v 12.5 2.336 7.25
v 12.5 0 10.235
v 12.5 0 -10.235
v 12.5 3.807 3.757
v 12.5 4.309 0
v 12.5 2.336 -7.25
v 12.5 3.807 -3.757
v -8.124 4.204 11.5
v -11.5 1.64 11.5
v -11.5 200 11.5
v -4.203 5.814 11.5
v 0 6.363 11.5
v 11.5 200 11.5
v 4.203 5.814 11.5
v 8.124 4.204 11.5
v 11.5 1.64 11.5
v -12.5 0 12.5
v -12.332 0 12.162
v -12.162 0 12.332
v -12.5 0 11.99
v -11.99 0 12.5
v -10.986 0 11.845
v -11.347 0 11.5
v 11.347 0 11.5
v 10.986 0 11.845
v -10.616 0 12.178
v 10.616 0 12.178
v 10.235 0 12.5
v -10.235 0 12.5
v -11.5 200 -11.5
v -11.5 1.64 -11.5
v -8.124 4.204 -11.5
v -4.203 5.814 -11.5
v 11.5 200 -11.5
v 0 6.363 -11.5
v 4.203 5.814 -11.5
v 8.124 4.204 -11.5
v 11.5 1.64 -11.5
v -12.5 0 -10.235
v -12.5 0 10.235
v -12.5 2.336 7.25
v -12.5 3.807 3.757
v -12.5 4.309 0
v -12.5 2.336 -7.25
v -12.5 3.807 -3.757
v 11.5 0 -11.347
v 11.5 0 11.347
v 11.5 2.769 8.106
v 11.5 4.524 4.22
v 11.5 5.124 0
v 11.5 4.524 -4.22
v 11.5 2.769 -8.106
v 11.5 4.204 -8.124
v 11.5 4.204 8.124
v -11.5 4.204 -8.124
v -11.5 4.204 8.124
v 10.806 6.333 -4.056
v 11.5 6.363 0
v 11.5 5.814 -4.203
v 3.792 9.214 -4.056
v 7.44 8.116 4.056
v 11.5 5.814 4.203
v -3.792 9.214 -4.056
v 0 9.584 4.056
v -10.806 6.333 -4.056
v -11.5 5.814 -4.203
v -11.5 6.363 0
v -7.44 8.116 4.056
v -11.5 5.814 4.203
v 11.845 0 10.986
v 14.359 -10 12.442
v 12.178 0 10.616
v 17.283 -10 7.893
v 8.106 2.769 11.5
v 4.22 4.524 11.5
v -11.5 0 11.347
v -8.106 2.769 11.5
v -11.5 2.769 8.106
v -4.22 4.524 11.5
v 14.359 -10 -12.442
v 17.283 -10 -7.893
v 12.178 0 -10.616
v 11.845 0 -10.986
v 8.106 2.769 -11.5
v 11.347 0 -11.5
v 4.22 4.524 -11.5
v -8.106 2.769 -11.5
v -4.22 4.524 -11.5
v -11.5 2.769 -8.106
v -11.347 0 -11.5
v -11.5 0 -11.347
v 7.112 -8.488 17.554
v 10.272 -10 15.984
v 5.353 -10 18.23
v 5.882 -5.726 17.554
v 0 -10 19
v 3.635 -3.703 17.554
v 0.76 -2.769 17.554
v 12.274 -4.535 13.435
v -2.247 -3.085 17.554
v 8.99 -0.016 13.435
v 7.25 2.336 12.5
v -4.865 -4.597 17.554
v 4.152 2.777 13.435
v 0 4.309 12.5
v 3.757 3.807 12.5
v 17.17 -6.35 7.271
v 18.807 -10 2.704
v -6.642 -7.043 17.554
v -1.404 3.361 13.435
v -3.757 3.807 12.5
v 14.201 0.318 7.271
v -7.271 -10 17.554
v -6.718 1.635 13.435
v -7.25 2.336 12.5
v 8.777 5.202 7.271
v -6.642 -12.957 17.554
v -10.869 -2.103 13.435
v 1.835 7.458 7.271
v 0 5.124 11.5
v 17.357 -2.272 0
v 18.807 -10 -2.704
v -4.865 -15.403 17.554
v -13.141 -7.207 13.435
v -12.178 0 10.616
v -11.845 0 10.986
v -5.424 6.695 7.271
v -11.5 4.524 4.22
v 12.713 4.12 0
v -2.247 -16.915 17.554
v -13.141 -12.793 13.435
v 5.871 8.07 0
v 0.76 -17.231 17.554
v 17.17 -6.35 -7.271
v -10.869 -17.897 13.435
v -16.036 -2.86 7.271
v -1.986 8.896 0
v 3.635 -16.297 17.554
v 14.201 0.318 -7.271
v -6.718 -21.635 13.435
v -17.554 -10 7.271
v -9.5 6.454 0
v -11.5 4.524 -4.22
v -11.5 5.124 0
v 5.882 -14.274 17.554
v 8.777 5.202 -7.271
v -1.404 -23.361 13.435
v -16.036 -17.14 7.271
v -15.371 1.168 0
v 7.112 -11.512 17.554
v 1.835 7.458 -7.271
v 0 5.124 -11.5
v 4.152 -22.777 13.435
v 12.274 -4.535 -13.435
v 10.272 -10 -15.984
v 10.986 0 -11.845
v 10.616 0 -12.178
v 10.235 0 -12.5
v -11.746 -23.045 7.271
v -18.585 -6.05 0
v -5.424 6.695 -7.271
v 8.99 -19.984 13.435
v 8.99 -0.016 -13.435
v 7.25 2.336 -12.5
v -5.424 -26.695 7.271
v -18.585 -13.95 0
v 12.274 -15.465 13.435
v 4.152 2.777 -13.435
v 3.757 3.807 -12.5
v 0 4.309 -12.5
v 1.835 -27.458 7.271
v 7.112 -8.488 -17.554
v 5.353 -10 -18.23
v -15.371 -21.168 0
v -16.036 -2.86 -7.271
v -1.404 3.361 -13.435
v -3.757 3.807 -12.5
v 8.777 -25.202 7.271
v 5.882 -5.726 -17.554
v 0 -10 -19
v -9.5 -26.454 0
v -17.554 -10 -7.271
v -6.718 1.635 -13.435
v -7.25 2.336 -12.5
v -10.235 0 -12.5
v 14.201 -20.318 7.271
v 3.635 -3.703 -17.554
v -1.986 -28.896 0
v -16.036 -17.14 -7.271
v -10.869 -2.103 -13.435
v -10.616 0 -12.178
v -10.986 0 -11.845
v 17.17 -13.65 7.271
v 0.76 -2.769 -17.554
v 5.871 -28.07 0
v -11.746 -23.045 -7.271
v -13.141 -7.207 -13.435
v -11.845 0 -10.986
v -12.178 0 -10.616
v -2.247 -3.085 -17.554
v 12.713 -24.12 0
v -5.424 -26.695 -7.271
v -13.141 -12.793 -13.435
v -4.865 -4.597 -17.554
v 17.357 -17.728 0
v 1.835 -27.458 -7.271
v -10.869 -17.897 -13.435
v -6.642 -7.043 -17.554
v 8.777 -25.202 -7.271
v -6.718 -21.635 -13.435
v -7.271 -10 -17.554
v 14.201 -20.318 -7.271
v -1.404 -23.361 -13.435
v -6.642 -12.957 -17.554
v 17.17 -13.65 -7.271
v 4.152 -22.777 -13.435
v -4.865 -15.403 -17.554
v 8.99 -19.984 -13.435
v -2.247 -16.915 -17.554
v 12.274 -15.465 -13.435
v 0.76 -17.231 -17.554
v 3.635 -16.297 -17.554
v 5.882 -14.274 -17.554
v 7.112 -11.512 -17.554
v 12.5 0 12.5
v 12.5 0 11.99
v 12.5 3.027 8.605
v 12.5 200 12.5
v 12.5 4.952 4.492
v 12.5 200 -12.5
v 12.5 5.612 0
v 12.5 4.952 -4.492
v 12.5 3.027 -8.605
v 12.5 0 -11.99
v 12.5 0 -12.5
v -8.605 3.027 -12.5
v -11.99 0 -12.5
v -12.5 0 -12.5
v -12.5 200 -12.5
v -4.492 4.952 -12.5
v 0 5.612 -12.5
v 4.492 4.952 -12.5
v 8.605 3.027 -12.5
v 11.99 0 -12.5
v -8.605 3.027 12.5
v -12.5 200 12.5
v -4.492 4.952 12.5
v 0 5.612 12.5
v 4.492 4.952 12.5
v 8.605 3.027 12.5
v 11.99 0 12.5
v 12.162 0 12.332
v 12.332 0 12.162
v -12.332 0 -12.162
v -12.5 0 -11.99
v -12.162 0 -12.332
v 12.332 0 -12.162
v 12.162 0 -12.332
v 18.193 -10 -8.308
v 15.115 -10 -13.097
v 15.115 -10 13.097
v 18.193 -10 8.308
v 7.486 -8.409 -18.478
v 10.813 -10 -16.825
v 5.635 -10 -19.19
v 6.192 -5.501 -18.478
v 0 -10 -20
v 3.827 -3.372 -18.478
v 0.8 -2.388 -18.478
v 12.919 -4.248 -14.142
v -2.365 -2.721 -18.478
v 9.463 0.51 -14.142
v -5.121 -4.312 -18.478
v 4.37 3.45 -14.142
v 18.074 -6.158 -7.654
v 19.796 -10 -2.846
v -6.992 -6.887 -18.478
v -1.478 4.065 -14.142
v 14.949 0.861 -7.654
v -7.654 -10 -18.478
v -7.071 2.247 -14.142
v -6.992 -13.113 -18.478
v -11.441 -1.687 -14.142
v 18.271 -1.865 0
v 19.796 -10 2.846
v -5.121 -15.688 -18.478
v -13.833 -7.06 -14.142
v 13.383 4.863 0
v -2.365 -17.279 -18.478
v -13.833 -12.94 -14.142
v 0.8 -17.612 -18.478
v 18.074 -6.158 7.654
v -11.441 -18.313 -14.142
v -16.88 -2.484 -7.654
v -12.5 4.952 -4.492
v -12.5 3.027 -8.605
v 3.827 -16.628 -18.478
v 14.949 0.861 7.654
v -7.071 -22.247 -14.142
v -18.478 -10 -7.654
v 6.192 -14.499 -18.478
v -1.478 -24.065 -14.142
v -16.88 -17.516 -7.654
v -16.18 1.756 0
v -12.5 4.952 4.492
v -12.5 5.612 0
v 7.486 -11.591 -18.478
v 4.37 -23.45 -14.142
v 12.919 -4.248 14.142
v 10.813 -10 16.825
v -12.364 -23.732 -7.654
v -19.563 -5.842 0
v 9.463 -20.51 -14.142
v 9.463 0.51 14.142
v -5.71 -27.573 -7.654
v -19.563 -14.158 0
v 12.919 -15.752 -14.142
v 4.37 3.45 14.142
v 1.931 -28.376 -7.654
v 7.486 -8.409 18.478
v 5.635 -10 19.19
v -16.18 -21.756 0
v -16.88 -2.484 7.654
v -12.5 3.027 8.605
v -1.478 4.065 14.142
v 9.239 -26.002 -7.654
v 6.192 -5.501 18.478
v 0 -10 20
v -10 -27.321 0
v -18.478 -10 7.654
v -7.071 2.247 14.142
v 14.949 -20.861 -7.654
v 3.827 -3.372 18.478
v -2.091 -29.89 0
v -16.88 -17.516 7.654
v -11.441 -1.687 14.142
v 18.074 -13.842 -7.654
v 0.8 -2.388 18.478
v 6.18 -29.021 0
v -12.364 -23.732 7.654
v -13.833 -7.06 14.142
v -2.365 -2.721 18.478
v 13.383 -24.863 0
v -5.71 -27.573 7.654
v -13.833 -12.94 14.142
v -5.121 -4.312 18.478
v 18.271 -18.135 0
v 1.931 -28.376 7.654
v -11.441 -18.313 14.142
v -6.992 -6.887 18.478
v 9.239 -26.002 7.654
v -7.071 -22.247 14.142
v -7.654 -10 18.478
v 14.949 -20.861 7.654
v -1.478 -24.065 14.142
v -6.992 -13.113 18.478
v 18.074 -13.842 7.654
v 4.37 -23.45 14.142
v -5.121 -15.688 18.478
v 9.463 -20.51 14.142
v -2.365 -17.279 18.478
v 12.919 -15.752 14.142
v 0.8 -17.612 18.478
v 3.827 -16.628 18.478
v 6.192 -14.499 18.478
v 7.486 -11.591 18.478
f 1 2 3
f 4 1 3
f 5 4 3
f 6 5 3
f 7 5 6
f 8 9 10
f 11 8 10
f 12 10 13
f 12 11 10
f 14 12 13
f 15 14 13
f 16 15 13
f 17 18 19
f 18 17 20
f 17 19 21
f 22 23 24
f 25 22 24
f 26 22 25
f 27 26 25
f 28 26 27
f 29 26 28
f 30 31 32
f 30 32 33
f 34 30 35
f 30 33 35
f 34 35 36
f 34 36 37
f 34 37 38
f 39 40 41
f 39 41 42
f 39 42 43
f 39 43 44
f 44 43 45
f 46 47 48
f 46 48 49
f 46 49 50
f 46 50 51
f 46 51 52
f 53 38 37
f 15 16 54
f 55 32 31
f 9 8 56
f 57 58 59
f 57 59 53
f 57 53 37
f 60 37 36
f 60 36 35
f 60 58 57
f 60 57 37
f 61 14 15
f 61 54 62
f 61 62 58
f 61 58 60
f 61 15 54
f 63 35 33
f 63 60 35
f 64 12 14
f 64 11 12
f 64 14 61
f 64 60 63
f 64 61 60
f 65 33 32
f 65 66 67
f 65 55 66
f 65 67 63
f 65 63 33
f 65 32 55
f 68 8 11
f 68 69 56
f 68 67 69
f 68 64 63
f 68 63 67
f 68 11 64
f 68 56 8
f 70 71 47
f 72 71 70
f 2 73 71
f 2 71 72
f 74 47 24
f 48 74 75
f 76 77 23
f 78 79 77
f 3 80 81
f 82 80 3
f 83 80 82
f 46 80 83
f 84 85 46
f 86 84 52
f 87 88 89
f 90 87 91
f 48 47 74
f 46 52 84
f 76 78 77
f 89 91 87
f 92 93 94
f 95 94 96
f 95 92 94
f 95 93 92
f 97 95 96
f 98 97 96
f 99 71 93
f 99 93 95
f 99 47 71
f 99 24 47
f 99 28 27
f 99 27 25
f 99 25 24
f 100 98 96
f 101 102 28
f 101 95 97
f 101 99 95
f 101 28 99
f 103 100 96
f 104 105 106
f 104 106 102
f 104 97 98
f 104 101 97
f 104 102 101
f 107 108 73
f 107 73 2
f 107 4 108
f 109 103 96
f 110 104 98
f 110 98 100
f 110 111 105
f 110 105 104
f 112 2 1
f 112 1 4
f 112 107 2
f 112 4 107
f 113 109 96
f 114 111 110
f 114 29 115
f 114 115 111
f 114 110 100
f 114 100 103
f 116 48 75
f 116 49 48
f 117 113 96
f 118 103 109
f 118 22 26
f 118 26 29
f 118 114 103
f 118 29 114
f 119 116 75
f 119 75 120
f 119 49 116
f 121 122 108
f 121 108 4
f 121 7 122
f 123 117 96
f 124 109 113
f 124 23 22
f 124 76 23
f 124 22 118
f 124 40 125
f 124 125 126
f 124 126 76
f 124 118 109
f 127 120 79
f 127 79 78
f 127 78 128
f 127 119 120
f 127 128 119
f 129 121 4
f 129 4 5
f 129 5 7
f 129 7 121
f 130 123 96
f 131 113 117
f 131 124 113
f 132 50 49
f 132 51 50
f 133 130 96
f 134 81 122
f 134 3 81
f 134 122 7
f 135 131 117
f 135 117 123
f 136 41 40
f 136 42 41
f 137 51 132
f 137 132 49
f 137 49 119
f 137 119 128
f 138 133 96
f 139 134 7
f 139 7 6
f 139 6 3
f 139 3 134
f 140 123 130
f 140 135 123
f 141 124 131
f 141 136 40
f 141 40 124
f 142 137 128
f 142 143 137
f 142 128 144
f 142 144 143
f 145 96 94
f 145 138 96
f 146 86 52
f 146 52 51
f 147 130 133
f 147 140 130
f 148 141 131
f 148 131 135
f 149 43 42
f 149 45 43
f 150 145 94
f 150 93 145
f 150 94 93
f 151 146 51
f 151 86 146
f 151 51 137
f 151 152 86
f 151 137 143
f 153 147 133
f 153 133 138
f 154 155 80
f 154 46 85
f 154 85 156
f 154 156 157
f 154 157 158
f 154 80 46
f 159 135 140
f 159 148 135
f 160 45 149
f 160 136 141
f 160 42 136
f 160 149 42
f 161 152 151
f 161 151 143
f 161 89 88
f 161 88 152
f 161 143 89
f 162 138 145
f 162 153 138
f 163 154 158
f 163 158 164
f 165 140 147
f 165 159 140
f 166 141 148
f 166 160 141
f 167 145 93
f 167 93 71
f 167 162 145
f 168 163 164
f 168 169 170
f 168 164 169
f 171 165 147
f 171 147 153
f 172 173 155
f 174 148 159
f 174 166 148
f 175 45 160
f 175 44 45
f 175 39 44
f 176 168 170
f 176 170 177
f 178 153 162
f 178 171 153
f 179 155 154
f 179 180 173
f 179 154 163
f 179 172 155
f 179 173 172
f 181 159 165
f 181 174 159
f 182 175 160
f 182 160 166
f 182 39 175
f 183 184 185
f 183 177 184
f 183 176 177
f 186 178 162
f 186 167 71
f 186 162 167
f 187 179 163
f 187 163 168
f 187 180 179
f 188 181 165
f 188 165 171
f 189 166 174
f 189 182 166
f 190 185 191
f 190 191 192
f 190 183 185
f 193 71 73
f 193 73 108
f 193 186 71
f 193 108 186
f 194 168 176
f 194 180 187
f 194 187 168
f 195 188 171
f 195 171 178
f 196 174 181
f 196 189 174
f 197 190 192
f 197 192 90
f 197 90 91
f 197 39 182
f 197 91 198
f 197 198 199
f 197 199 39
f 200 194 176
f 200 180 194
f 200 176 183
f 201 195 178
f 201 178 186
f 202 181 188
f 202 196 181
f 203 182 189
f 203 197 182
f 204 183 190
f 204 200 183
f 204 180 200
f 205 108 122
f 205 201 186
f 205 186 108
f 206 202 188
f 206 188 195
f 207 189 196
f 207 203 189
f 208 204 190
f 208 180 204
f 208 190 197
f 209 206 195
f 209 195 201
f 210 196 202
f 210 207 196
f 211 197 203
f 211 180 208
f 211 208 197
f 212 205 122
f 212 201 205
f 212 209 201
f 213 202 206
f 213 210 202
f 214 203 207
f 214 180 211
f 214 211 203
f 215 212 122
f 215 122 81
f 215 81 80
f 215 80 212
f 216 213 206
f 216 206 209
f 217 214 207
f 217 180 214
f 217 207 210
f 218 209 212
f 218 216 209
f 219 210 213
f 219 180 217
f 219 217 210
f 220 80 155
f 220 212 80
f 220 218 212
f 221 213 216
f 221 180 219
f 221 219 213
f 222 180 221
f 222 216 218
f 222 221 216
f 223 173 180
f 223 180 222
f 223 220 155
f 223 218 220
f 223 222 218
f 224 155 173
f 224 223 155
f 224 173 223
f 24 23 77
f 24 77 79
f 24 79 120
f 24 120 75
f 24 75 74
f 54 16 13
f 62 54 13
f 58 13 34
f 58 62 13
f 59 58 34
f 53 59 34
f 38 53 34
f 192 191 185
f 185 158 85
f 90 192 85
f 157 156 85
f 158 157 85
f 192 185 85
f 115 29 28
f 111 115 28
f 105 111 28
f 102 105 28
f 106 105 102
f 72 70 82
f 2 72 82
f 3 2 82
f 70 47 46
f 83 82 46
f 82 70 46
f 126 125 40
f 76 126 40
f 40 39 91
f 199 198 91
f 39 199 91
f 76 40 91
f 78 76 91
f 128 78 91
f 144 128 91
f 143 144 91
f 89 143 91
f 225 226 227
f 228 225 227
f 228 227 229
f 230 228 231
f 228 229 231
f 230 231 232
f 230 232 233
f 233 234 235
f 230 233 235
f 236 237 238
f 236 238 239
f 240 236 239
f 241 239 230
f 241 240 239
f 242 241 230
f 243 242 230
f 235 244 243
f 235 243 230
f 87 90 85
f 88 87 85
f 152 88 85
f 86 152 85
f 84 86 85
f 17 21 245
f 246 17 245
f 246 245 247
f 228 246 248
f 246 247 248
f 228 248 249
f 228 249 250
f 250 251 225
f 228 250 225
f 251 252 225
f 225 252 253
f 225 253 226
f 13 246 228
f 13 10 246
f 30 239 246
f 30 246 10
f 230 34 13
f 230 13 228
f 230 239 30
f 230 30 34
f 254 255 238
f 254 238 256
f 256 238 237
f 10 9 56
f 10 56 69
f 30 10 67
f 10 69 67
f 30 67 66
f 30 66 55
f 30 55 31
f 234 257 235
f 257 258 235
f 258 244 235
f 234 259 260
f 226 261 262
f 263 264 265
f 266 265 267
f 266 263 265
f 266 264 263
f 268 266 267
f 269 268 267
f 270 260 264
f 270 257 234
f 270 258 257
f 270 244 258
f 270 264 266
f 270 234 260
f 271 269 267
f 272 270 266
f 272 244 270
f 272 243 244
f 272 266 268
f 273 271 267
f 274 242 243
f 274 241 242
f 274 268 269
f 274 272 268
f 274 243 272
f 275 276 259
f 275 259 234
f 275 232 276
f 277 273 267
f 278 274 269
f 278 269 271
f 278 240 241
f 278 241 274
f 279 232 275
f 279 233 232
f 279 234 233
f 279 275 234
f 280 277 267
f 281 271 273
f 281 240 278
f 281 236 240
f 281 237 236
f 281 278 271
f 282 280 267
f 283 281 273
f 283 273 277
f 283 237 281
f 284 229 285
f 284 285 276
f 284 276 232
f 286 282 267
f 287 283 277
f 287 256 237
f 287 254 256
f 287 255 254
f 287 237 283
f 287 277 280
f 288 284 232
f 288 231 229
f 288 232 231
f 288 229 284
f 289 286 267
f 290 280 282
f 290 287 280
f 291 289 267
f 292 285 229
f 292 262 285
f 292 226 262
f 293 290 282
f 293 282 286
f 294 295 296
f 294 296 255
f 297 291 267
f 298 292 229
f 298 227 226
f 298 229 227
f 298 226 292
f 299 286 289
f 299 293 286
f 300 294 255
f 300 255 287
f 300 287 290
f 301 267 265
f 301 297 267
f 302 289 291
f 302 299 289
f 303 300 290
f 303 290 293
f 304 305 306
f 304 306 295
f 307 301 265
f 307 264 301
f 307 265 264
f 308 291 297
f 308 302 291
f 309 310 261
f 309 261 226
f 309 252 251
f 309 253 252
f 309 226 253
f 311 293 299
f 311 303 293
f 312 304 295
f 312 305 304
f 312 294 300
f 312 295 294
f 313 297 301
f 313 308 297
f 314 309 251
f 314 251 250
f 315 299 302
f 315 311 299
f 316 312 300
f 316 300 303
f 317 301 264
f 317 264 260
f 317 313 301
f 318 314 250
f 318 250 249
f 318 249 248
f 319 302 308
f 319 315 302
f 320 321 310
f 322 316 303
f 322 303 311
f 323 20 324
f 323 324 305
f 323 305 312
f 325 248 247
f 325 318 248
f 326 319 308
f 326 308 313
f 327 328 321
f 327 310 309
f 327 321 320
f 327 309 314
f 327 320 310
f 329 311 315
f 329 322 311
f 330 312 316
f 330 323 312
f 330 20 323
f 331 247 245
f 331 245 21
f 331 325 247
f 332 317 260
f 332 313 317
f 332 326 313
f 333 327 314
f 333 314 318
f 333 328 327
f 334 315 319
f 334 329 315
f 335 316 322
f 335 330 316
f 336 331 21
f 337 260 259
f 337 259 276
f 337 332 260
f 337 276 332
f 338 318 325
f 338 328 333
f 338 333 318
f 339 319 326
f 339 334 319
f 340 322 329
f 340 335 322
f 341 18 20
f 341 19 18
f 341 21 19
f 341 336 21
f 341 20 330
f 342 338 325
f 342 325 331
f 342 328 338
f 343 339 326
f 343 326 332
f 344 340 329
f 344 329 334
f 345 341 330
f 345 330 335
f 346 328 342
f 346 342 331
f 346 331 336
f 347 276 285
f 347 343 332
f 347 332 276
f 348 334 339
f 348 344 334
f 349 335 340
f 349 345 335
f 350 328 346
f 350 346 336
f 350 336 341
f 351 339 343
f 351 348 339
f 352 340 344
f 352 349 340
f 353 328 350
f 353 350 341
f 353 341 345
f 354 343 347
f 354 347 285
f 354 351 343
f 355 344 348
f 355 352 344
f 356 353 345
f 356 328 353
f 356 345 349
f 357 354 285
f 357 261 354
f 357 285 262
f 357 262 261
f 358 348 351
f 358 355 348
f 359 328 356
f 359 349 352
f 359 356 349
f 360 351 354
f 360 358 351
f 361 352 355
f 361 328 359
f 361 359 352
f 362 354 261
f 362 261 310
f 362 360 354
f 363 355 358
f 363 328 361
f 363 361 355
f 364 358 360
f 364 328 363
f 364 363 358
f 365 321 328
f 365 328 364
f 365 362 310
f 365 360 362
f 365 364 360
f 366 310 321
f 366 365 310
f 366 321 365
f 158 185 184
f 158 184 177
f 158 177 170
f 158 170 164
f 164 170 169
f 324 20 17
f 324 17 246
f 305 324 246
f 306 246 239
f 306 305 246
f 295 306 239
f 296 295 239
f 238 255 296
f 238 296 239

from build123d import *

# Parameters (mm, degrees)
SKETCH1_W           = 25
SKETCH1_H           = 25
SKETCH1_W_2         = 23
SKETCH1_H_2         = 23
BOSS_EXTRUDE1_DEPTH = 200


with BuildPart() as part:
    # Sketch1 → Boss-Extrude1 (new body)
    with BuildSketch(Plane(origin=(0, 0, 0), x_dir=(1, 0, 0), z_dir=(0, 1, 0))):
        Rectangle(SKETCH1_W, SKETCH1_H)
        Rectangle(SKETCH1_W_2, SKETCH1_H_2, mode=Mode.SUBTRACT)
    extrude(amount=BOSS_EXTRUDE1_DEPTH)

    # Sketch2 → Revolve1 (revolve)
    with BuildSketch(Plane(origin=(0, -10, 0), x_dir=(-1, 0, 0), z_dir=(0, -1, 0))):
        with BuildLine():
            Line((0, 19), (0, 20))
            ThreePointArc((0, 20), (-20, 0), (0, -20))
            Line((0, -20), (0, -19))
            ThreePointArc((0, -19), (-19, 0), (0, 19))
        make_face()
    revolve(axis=Axis((0, -10, -20), (0, 0, 1)))


solid = part.part
